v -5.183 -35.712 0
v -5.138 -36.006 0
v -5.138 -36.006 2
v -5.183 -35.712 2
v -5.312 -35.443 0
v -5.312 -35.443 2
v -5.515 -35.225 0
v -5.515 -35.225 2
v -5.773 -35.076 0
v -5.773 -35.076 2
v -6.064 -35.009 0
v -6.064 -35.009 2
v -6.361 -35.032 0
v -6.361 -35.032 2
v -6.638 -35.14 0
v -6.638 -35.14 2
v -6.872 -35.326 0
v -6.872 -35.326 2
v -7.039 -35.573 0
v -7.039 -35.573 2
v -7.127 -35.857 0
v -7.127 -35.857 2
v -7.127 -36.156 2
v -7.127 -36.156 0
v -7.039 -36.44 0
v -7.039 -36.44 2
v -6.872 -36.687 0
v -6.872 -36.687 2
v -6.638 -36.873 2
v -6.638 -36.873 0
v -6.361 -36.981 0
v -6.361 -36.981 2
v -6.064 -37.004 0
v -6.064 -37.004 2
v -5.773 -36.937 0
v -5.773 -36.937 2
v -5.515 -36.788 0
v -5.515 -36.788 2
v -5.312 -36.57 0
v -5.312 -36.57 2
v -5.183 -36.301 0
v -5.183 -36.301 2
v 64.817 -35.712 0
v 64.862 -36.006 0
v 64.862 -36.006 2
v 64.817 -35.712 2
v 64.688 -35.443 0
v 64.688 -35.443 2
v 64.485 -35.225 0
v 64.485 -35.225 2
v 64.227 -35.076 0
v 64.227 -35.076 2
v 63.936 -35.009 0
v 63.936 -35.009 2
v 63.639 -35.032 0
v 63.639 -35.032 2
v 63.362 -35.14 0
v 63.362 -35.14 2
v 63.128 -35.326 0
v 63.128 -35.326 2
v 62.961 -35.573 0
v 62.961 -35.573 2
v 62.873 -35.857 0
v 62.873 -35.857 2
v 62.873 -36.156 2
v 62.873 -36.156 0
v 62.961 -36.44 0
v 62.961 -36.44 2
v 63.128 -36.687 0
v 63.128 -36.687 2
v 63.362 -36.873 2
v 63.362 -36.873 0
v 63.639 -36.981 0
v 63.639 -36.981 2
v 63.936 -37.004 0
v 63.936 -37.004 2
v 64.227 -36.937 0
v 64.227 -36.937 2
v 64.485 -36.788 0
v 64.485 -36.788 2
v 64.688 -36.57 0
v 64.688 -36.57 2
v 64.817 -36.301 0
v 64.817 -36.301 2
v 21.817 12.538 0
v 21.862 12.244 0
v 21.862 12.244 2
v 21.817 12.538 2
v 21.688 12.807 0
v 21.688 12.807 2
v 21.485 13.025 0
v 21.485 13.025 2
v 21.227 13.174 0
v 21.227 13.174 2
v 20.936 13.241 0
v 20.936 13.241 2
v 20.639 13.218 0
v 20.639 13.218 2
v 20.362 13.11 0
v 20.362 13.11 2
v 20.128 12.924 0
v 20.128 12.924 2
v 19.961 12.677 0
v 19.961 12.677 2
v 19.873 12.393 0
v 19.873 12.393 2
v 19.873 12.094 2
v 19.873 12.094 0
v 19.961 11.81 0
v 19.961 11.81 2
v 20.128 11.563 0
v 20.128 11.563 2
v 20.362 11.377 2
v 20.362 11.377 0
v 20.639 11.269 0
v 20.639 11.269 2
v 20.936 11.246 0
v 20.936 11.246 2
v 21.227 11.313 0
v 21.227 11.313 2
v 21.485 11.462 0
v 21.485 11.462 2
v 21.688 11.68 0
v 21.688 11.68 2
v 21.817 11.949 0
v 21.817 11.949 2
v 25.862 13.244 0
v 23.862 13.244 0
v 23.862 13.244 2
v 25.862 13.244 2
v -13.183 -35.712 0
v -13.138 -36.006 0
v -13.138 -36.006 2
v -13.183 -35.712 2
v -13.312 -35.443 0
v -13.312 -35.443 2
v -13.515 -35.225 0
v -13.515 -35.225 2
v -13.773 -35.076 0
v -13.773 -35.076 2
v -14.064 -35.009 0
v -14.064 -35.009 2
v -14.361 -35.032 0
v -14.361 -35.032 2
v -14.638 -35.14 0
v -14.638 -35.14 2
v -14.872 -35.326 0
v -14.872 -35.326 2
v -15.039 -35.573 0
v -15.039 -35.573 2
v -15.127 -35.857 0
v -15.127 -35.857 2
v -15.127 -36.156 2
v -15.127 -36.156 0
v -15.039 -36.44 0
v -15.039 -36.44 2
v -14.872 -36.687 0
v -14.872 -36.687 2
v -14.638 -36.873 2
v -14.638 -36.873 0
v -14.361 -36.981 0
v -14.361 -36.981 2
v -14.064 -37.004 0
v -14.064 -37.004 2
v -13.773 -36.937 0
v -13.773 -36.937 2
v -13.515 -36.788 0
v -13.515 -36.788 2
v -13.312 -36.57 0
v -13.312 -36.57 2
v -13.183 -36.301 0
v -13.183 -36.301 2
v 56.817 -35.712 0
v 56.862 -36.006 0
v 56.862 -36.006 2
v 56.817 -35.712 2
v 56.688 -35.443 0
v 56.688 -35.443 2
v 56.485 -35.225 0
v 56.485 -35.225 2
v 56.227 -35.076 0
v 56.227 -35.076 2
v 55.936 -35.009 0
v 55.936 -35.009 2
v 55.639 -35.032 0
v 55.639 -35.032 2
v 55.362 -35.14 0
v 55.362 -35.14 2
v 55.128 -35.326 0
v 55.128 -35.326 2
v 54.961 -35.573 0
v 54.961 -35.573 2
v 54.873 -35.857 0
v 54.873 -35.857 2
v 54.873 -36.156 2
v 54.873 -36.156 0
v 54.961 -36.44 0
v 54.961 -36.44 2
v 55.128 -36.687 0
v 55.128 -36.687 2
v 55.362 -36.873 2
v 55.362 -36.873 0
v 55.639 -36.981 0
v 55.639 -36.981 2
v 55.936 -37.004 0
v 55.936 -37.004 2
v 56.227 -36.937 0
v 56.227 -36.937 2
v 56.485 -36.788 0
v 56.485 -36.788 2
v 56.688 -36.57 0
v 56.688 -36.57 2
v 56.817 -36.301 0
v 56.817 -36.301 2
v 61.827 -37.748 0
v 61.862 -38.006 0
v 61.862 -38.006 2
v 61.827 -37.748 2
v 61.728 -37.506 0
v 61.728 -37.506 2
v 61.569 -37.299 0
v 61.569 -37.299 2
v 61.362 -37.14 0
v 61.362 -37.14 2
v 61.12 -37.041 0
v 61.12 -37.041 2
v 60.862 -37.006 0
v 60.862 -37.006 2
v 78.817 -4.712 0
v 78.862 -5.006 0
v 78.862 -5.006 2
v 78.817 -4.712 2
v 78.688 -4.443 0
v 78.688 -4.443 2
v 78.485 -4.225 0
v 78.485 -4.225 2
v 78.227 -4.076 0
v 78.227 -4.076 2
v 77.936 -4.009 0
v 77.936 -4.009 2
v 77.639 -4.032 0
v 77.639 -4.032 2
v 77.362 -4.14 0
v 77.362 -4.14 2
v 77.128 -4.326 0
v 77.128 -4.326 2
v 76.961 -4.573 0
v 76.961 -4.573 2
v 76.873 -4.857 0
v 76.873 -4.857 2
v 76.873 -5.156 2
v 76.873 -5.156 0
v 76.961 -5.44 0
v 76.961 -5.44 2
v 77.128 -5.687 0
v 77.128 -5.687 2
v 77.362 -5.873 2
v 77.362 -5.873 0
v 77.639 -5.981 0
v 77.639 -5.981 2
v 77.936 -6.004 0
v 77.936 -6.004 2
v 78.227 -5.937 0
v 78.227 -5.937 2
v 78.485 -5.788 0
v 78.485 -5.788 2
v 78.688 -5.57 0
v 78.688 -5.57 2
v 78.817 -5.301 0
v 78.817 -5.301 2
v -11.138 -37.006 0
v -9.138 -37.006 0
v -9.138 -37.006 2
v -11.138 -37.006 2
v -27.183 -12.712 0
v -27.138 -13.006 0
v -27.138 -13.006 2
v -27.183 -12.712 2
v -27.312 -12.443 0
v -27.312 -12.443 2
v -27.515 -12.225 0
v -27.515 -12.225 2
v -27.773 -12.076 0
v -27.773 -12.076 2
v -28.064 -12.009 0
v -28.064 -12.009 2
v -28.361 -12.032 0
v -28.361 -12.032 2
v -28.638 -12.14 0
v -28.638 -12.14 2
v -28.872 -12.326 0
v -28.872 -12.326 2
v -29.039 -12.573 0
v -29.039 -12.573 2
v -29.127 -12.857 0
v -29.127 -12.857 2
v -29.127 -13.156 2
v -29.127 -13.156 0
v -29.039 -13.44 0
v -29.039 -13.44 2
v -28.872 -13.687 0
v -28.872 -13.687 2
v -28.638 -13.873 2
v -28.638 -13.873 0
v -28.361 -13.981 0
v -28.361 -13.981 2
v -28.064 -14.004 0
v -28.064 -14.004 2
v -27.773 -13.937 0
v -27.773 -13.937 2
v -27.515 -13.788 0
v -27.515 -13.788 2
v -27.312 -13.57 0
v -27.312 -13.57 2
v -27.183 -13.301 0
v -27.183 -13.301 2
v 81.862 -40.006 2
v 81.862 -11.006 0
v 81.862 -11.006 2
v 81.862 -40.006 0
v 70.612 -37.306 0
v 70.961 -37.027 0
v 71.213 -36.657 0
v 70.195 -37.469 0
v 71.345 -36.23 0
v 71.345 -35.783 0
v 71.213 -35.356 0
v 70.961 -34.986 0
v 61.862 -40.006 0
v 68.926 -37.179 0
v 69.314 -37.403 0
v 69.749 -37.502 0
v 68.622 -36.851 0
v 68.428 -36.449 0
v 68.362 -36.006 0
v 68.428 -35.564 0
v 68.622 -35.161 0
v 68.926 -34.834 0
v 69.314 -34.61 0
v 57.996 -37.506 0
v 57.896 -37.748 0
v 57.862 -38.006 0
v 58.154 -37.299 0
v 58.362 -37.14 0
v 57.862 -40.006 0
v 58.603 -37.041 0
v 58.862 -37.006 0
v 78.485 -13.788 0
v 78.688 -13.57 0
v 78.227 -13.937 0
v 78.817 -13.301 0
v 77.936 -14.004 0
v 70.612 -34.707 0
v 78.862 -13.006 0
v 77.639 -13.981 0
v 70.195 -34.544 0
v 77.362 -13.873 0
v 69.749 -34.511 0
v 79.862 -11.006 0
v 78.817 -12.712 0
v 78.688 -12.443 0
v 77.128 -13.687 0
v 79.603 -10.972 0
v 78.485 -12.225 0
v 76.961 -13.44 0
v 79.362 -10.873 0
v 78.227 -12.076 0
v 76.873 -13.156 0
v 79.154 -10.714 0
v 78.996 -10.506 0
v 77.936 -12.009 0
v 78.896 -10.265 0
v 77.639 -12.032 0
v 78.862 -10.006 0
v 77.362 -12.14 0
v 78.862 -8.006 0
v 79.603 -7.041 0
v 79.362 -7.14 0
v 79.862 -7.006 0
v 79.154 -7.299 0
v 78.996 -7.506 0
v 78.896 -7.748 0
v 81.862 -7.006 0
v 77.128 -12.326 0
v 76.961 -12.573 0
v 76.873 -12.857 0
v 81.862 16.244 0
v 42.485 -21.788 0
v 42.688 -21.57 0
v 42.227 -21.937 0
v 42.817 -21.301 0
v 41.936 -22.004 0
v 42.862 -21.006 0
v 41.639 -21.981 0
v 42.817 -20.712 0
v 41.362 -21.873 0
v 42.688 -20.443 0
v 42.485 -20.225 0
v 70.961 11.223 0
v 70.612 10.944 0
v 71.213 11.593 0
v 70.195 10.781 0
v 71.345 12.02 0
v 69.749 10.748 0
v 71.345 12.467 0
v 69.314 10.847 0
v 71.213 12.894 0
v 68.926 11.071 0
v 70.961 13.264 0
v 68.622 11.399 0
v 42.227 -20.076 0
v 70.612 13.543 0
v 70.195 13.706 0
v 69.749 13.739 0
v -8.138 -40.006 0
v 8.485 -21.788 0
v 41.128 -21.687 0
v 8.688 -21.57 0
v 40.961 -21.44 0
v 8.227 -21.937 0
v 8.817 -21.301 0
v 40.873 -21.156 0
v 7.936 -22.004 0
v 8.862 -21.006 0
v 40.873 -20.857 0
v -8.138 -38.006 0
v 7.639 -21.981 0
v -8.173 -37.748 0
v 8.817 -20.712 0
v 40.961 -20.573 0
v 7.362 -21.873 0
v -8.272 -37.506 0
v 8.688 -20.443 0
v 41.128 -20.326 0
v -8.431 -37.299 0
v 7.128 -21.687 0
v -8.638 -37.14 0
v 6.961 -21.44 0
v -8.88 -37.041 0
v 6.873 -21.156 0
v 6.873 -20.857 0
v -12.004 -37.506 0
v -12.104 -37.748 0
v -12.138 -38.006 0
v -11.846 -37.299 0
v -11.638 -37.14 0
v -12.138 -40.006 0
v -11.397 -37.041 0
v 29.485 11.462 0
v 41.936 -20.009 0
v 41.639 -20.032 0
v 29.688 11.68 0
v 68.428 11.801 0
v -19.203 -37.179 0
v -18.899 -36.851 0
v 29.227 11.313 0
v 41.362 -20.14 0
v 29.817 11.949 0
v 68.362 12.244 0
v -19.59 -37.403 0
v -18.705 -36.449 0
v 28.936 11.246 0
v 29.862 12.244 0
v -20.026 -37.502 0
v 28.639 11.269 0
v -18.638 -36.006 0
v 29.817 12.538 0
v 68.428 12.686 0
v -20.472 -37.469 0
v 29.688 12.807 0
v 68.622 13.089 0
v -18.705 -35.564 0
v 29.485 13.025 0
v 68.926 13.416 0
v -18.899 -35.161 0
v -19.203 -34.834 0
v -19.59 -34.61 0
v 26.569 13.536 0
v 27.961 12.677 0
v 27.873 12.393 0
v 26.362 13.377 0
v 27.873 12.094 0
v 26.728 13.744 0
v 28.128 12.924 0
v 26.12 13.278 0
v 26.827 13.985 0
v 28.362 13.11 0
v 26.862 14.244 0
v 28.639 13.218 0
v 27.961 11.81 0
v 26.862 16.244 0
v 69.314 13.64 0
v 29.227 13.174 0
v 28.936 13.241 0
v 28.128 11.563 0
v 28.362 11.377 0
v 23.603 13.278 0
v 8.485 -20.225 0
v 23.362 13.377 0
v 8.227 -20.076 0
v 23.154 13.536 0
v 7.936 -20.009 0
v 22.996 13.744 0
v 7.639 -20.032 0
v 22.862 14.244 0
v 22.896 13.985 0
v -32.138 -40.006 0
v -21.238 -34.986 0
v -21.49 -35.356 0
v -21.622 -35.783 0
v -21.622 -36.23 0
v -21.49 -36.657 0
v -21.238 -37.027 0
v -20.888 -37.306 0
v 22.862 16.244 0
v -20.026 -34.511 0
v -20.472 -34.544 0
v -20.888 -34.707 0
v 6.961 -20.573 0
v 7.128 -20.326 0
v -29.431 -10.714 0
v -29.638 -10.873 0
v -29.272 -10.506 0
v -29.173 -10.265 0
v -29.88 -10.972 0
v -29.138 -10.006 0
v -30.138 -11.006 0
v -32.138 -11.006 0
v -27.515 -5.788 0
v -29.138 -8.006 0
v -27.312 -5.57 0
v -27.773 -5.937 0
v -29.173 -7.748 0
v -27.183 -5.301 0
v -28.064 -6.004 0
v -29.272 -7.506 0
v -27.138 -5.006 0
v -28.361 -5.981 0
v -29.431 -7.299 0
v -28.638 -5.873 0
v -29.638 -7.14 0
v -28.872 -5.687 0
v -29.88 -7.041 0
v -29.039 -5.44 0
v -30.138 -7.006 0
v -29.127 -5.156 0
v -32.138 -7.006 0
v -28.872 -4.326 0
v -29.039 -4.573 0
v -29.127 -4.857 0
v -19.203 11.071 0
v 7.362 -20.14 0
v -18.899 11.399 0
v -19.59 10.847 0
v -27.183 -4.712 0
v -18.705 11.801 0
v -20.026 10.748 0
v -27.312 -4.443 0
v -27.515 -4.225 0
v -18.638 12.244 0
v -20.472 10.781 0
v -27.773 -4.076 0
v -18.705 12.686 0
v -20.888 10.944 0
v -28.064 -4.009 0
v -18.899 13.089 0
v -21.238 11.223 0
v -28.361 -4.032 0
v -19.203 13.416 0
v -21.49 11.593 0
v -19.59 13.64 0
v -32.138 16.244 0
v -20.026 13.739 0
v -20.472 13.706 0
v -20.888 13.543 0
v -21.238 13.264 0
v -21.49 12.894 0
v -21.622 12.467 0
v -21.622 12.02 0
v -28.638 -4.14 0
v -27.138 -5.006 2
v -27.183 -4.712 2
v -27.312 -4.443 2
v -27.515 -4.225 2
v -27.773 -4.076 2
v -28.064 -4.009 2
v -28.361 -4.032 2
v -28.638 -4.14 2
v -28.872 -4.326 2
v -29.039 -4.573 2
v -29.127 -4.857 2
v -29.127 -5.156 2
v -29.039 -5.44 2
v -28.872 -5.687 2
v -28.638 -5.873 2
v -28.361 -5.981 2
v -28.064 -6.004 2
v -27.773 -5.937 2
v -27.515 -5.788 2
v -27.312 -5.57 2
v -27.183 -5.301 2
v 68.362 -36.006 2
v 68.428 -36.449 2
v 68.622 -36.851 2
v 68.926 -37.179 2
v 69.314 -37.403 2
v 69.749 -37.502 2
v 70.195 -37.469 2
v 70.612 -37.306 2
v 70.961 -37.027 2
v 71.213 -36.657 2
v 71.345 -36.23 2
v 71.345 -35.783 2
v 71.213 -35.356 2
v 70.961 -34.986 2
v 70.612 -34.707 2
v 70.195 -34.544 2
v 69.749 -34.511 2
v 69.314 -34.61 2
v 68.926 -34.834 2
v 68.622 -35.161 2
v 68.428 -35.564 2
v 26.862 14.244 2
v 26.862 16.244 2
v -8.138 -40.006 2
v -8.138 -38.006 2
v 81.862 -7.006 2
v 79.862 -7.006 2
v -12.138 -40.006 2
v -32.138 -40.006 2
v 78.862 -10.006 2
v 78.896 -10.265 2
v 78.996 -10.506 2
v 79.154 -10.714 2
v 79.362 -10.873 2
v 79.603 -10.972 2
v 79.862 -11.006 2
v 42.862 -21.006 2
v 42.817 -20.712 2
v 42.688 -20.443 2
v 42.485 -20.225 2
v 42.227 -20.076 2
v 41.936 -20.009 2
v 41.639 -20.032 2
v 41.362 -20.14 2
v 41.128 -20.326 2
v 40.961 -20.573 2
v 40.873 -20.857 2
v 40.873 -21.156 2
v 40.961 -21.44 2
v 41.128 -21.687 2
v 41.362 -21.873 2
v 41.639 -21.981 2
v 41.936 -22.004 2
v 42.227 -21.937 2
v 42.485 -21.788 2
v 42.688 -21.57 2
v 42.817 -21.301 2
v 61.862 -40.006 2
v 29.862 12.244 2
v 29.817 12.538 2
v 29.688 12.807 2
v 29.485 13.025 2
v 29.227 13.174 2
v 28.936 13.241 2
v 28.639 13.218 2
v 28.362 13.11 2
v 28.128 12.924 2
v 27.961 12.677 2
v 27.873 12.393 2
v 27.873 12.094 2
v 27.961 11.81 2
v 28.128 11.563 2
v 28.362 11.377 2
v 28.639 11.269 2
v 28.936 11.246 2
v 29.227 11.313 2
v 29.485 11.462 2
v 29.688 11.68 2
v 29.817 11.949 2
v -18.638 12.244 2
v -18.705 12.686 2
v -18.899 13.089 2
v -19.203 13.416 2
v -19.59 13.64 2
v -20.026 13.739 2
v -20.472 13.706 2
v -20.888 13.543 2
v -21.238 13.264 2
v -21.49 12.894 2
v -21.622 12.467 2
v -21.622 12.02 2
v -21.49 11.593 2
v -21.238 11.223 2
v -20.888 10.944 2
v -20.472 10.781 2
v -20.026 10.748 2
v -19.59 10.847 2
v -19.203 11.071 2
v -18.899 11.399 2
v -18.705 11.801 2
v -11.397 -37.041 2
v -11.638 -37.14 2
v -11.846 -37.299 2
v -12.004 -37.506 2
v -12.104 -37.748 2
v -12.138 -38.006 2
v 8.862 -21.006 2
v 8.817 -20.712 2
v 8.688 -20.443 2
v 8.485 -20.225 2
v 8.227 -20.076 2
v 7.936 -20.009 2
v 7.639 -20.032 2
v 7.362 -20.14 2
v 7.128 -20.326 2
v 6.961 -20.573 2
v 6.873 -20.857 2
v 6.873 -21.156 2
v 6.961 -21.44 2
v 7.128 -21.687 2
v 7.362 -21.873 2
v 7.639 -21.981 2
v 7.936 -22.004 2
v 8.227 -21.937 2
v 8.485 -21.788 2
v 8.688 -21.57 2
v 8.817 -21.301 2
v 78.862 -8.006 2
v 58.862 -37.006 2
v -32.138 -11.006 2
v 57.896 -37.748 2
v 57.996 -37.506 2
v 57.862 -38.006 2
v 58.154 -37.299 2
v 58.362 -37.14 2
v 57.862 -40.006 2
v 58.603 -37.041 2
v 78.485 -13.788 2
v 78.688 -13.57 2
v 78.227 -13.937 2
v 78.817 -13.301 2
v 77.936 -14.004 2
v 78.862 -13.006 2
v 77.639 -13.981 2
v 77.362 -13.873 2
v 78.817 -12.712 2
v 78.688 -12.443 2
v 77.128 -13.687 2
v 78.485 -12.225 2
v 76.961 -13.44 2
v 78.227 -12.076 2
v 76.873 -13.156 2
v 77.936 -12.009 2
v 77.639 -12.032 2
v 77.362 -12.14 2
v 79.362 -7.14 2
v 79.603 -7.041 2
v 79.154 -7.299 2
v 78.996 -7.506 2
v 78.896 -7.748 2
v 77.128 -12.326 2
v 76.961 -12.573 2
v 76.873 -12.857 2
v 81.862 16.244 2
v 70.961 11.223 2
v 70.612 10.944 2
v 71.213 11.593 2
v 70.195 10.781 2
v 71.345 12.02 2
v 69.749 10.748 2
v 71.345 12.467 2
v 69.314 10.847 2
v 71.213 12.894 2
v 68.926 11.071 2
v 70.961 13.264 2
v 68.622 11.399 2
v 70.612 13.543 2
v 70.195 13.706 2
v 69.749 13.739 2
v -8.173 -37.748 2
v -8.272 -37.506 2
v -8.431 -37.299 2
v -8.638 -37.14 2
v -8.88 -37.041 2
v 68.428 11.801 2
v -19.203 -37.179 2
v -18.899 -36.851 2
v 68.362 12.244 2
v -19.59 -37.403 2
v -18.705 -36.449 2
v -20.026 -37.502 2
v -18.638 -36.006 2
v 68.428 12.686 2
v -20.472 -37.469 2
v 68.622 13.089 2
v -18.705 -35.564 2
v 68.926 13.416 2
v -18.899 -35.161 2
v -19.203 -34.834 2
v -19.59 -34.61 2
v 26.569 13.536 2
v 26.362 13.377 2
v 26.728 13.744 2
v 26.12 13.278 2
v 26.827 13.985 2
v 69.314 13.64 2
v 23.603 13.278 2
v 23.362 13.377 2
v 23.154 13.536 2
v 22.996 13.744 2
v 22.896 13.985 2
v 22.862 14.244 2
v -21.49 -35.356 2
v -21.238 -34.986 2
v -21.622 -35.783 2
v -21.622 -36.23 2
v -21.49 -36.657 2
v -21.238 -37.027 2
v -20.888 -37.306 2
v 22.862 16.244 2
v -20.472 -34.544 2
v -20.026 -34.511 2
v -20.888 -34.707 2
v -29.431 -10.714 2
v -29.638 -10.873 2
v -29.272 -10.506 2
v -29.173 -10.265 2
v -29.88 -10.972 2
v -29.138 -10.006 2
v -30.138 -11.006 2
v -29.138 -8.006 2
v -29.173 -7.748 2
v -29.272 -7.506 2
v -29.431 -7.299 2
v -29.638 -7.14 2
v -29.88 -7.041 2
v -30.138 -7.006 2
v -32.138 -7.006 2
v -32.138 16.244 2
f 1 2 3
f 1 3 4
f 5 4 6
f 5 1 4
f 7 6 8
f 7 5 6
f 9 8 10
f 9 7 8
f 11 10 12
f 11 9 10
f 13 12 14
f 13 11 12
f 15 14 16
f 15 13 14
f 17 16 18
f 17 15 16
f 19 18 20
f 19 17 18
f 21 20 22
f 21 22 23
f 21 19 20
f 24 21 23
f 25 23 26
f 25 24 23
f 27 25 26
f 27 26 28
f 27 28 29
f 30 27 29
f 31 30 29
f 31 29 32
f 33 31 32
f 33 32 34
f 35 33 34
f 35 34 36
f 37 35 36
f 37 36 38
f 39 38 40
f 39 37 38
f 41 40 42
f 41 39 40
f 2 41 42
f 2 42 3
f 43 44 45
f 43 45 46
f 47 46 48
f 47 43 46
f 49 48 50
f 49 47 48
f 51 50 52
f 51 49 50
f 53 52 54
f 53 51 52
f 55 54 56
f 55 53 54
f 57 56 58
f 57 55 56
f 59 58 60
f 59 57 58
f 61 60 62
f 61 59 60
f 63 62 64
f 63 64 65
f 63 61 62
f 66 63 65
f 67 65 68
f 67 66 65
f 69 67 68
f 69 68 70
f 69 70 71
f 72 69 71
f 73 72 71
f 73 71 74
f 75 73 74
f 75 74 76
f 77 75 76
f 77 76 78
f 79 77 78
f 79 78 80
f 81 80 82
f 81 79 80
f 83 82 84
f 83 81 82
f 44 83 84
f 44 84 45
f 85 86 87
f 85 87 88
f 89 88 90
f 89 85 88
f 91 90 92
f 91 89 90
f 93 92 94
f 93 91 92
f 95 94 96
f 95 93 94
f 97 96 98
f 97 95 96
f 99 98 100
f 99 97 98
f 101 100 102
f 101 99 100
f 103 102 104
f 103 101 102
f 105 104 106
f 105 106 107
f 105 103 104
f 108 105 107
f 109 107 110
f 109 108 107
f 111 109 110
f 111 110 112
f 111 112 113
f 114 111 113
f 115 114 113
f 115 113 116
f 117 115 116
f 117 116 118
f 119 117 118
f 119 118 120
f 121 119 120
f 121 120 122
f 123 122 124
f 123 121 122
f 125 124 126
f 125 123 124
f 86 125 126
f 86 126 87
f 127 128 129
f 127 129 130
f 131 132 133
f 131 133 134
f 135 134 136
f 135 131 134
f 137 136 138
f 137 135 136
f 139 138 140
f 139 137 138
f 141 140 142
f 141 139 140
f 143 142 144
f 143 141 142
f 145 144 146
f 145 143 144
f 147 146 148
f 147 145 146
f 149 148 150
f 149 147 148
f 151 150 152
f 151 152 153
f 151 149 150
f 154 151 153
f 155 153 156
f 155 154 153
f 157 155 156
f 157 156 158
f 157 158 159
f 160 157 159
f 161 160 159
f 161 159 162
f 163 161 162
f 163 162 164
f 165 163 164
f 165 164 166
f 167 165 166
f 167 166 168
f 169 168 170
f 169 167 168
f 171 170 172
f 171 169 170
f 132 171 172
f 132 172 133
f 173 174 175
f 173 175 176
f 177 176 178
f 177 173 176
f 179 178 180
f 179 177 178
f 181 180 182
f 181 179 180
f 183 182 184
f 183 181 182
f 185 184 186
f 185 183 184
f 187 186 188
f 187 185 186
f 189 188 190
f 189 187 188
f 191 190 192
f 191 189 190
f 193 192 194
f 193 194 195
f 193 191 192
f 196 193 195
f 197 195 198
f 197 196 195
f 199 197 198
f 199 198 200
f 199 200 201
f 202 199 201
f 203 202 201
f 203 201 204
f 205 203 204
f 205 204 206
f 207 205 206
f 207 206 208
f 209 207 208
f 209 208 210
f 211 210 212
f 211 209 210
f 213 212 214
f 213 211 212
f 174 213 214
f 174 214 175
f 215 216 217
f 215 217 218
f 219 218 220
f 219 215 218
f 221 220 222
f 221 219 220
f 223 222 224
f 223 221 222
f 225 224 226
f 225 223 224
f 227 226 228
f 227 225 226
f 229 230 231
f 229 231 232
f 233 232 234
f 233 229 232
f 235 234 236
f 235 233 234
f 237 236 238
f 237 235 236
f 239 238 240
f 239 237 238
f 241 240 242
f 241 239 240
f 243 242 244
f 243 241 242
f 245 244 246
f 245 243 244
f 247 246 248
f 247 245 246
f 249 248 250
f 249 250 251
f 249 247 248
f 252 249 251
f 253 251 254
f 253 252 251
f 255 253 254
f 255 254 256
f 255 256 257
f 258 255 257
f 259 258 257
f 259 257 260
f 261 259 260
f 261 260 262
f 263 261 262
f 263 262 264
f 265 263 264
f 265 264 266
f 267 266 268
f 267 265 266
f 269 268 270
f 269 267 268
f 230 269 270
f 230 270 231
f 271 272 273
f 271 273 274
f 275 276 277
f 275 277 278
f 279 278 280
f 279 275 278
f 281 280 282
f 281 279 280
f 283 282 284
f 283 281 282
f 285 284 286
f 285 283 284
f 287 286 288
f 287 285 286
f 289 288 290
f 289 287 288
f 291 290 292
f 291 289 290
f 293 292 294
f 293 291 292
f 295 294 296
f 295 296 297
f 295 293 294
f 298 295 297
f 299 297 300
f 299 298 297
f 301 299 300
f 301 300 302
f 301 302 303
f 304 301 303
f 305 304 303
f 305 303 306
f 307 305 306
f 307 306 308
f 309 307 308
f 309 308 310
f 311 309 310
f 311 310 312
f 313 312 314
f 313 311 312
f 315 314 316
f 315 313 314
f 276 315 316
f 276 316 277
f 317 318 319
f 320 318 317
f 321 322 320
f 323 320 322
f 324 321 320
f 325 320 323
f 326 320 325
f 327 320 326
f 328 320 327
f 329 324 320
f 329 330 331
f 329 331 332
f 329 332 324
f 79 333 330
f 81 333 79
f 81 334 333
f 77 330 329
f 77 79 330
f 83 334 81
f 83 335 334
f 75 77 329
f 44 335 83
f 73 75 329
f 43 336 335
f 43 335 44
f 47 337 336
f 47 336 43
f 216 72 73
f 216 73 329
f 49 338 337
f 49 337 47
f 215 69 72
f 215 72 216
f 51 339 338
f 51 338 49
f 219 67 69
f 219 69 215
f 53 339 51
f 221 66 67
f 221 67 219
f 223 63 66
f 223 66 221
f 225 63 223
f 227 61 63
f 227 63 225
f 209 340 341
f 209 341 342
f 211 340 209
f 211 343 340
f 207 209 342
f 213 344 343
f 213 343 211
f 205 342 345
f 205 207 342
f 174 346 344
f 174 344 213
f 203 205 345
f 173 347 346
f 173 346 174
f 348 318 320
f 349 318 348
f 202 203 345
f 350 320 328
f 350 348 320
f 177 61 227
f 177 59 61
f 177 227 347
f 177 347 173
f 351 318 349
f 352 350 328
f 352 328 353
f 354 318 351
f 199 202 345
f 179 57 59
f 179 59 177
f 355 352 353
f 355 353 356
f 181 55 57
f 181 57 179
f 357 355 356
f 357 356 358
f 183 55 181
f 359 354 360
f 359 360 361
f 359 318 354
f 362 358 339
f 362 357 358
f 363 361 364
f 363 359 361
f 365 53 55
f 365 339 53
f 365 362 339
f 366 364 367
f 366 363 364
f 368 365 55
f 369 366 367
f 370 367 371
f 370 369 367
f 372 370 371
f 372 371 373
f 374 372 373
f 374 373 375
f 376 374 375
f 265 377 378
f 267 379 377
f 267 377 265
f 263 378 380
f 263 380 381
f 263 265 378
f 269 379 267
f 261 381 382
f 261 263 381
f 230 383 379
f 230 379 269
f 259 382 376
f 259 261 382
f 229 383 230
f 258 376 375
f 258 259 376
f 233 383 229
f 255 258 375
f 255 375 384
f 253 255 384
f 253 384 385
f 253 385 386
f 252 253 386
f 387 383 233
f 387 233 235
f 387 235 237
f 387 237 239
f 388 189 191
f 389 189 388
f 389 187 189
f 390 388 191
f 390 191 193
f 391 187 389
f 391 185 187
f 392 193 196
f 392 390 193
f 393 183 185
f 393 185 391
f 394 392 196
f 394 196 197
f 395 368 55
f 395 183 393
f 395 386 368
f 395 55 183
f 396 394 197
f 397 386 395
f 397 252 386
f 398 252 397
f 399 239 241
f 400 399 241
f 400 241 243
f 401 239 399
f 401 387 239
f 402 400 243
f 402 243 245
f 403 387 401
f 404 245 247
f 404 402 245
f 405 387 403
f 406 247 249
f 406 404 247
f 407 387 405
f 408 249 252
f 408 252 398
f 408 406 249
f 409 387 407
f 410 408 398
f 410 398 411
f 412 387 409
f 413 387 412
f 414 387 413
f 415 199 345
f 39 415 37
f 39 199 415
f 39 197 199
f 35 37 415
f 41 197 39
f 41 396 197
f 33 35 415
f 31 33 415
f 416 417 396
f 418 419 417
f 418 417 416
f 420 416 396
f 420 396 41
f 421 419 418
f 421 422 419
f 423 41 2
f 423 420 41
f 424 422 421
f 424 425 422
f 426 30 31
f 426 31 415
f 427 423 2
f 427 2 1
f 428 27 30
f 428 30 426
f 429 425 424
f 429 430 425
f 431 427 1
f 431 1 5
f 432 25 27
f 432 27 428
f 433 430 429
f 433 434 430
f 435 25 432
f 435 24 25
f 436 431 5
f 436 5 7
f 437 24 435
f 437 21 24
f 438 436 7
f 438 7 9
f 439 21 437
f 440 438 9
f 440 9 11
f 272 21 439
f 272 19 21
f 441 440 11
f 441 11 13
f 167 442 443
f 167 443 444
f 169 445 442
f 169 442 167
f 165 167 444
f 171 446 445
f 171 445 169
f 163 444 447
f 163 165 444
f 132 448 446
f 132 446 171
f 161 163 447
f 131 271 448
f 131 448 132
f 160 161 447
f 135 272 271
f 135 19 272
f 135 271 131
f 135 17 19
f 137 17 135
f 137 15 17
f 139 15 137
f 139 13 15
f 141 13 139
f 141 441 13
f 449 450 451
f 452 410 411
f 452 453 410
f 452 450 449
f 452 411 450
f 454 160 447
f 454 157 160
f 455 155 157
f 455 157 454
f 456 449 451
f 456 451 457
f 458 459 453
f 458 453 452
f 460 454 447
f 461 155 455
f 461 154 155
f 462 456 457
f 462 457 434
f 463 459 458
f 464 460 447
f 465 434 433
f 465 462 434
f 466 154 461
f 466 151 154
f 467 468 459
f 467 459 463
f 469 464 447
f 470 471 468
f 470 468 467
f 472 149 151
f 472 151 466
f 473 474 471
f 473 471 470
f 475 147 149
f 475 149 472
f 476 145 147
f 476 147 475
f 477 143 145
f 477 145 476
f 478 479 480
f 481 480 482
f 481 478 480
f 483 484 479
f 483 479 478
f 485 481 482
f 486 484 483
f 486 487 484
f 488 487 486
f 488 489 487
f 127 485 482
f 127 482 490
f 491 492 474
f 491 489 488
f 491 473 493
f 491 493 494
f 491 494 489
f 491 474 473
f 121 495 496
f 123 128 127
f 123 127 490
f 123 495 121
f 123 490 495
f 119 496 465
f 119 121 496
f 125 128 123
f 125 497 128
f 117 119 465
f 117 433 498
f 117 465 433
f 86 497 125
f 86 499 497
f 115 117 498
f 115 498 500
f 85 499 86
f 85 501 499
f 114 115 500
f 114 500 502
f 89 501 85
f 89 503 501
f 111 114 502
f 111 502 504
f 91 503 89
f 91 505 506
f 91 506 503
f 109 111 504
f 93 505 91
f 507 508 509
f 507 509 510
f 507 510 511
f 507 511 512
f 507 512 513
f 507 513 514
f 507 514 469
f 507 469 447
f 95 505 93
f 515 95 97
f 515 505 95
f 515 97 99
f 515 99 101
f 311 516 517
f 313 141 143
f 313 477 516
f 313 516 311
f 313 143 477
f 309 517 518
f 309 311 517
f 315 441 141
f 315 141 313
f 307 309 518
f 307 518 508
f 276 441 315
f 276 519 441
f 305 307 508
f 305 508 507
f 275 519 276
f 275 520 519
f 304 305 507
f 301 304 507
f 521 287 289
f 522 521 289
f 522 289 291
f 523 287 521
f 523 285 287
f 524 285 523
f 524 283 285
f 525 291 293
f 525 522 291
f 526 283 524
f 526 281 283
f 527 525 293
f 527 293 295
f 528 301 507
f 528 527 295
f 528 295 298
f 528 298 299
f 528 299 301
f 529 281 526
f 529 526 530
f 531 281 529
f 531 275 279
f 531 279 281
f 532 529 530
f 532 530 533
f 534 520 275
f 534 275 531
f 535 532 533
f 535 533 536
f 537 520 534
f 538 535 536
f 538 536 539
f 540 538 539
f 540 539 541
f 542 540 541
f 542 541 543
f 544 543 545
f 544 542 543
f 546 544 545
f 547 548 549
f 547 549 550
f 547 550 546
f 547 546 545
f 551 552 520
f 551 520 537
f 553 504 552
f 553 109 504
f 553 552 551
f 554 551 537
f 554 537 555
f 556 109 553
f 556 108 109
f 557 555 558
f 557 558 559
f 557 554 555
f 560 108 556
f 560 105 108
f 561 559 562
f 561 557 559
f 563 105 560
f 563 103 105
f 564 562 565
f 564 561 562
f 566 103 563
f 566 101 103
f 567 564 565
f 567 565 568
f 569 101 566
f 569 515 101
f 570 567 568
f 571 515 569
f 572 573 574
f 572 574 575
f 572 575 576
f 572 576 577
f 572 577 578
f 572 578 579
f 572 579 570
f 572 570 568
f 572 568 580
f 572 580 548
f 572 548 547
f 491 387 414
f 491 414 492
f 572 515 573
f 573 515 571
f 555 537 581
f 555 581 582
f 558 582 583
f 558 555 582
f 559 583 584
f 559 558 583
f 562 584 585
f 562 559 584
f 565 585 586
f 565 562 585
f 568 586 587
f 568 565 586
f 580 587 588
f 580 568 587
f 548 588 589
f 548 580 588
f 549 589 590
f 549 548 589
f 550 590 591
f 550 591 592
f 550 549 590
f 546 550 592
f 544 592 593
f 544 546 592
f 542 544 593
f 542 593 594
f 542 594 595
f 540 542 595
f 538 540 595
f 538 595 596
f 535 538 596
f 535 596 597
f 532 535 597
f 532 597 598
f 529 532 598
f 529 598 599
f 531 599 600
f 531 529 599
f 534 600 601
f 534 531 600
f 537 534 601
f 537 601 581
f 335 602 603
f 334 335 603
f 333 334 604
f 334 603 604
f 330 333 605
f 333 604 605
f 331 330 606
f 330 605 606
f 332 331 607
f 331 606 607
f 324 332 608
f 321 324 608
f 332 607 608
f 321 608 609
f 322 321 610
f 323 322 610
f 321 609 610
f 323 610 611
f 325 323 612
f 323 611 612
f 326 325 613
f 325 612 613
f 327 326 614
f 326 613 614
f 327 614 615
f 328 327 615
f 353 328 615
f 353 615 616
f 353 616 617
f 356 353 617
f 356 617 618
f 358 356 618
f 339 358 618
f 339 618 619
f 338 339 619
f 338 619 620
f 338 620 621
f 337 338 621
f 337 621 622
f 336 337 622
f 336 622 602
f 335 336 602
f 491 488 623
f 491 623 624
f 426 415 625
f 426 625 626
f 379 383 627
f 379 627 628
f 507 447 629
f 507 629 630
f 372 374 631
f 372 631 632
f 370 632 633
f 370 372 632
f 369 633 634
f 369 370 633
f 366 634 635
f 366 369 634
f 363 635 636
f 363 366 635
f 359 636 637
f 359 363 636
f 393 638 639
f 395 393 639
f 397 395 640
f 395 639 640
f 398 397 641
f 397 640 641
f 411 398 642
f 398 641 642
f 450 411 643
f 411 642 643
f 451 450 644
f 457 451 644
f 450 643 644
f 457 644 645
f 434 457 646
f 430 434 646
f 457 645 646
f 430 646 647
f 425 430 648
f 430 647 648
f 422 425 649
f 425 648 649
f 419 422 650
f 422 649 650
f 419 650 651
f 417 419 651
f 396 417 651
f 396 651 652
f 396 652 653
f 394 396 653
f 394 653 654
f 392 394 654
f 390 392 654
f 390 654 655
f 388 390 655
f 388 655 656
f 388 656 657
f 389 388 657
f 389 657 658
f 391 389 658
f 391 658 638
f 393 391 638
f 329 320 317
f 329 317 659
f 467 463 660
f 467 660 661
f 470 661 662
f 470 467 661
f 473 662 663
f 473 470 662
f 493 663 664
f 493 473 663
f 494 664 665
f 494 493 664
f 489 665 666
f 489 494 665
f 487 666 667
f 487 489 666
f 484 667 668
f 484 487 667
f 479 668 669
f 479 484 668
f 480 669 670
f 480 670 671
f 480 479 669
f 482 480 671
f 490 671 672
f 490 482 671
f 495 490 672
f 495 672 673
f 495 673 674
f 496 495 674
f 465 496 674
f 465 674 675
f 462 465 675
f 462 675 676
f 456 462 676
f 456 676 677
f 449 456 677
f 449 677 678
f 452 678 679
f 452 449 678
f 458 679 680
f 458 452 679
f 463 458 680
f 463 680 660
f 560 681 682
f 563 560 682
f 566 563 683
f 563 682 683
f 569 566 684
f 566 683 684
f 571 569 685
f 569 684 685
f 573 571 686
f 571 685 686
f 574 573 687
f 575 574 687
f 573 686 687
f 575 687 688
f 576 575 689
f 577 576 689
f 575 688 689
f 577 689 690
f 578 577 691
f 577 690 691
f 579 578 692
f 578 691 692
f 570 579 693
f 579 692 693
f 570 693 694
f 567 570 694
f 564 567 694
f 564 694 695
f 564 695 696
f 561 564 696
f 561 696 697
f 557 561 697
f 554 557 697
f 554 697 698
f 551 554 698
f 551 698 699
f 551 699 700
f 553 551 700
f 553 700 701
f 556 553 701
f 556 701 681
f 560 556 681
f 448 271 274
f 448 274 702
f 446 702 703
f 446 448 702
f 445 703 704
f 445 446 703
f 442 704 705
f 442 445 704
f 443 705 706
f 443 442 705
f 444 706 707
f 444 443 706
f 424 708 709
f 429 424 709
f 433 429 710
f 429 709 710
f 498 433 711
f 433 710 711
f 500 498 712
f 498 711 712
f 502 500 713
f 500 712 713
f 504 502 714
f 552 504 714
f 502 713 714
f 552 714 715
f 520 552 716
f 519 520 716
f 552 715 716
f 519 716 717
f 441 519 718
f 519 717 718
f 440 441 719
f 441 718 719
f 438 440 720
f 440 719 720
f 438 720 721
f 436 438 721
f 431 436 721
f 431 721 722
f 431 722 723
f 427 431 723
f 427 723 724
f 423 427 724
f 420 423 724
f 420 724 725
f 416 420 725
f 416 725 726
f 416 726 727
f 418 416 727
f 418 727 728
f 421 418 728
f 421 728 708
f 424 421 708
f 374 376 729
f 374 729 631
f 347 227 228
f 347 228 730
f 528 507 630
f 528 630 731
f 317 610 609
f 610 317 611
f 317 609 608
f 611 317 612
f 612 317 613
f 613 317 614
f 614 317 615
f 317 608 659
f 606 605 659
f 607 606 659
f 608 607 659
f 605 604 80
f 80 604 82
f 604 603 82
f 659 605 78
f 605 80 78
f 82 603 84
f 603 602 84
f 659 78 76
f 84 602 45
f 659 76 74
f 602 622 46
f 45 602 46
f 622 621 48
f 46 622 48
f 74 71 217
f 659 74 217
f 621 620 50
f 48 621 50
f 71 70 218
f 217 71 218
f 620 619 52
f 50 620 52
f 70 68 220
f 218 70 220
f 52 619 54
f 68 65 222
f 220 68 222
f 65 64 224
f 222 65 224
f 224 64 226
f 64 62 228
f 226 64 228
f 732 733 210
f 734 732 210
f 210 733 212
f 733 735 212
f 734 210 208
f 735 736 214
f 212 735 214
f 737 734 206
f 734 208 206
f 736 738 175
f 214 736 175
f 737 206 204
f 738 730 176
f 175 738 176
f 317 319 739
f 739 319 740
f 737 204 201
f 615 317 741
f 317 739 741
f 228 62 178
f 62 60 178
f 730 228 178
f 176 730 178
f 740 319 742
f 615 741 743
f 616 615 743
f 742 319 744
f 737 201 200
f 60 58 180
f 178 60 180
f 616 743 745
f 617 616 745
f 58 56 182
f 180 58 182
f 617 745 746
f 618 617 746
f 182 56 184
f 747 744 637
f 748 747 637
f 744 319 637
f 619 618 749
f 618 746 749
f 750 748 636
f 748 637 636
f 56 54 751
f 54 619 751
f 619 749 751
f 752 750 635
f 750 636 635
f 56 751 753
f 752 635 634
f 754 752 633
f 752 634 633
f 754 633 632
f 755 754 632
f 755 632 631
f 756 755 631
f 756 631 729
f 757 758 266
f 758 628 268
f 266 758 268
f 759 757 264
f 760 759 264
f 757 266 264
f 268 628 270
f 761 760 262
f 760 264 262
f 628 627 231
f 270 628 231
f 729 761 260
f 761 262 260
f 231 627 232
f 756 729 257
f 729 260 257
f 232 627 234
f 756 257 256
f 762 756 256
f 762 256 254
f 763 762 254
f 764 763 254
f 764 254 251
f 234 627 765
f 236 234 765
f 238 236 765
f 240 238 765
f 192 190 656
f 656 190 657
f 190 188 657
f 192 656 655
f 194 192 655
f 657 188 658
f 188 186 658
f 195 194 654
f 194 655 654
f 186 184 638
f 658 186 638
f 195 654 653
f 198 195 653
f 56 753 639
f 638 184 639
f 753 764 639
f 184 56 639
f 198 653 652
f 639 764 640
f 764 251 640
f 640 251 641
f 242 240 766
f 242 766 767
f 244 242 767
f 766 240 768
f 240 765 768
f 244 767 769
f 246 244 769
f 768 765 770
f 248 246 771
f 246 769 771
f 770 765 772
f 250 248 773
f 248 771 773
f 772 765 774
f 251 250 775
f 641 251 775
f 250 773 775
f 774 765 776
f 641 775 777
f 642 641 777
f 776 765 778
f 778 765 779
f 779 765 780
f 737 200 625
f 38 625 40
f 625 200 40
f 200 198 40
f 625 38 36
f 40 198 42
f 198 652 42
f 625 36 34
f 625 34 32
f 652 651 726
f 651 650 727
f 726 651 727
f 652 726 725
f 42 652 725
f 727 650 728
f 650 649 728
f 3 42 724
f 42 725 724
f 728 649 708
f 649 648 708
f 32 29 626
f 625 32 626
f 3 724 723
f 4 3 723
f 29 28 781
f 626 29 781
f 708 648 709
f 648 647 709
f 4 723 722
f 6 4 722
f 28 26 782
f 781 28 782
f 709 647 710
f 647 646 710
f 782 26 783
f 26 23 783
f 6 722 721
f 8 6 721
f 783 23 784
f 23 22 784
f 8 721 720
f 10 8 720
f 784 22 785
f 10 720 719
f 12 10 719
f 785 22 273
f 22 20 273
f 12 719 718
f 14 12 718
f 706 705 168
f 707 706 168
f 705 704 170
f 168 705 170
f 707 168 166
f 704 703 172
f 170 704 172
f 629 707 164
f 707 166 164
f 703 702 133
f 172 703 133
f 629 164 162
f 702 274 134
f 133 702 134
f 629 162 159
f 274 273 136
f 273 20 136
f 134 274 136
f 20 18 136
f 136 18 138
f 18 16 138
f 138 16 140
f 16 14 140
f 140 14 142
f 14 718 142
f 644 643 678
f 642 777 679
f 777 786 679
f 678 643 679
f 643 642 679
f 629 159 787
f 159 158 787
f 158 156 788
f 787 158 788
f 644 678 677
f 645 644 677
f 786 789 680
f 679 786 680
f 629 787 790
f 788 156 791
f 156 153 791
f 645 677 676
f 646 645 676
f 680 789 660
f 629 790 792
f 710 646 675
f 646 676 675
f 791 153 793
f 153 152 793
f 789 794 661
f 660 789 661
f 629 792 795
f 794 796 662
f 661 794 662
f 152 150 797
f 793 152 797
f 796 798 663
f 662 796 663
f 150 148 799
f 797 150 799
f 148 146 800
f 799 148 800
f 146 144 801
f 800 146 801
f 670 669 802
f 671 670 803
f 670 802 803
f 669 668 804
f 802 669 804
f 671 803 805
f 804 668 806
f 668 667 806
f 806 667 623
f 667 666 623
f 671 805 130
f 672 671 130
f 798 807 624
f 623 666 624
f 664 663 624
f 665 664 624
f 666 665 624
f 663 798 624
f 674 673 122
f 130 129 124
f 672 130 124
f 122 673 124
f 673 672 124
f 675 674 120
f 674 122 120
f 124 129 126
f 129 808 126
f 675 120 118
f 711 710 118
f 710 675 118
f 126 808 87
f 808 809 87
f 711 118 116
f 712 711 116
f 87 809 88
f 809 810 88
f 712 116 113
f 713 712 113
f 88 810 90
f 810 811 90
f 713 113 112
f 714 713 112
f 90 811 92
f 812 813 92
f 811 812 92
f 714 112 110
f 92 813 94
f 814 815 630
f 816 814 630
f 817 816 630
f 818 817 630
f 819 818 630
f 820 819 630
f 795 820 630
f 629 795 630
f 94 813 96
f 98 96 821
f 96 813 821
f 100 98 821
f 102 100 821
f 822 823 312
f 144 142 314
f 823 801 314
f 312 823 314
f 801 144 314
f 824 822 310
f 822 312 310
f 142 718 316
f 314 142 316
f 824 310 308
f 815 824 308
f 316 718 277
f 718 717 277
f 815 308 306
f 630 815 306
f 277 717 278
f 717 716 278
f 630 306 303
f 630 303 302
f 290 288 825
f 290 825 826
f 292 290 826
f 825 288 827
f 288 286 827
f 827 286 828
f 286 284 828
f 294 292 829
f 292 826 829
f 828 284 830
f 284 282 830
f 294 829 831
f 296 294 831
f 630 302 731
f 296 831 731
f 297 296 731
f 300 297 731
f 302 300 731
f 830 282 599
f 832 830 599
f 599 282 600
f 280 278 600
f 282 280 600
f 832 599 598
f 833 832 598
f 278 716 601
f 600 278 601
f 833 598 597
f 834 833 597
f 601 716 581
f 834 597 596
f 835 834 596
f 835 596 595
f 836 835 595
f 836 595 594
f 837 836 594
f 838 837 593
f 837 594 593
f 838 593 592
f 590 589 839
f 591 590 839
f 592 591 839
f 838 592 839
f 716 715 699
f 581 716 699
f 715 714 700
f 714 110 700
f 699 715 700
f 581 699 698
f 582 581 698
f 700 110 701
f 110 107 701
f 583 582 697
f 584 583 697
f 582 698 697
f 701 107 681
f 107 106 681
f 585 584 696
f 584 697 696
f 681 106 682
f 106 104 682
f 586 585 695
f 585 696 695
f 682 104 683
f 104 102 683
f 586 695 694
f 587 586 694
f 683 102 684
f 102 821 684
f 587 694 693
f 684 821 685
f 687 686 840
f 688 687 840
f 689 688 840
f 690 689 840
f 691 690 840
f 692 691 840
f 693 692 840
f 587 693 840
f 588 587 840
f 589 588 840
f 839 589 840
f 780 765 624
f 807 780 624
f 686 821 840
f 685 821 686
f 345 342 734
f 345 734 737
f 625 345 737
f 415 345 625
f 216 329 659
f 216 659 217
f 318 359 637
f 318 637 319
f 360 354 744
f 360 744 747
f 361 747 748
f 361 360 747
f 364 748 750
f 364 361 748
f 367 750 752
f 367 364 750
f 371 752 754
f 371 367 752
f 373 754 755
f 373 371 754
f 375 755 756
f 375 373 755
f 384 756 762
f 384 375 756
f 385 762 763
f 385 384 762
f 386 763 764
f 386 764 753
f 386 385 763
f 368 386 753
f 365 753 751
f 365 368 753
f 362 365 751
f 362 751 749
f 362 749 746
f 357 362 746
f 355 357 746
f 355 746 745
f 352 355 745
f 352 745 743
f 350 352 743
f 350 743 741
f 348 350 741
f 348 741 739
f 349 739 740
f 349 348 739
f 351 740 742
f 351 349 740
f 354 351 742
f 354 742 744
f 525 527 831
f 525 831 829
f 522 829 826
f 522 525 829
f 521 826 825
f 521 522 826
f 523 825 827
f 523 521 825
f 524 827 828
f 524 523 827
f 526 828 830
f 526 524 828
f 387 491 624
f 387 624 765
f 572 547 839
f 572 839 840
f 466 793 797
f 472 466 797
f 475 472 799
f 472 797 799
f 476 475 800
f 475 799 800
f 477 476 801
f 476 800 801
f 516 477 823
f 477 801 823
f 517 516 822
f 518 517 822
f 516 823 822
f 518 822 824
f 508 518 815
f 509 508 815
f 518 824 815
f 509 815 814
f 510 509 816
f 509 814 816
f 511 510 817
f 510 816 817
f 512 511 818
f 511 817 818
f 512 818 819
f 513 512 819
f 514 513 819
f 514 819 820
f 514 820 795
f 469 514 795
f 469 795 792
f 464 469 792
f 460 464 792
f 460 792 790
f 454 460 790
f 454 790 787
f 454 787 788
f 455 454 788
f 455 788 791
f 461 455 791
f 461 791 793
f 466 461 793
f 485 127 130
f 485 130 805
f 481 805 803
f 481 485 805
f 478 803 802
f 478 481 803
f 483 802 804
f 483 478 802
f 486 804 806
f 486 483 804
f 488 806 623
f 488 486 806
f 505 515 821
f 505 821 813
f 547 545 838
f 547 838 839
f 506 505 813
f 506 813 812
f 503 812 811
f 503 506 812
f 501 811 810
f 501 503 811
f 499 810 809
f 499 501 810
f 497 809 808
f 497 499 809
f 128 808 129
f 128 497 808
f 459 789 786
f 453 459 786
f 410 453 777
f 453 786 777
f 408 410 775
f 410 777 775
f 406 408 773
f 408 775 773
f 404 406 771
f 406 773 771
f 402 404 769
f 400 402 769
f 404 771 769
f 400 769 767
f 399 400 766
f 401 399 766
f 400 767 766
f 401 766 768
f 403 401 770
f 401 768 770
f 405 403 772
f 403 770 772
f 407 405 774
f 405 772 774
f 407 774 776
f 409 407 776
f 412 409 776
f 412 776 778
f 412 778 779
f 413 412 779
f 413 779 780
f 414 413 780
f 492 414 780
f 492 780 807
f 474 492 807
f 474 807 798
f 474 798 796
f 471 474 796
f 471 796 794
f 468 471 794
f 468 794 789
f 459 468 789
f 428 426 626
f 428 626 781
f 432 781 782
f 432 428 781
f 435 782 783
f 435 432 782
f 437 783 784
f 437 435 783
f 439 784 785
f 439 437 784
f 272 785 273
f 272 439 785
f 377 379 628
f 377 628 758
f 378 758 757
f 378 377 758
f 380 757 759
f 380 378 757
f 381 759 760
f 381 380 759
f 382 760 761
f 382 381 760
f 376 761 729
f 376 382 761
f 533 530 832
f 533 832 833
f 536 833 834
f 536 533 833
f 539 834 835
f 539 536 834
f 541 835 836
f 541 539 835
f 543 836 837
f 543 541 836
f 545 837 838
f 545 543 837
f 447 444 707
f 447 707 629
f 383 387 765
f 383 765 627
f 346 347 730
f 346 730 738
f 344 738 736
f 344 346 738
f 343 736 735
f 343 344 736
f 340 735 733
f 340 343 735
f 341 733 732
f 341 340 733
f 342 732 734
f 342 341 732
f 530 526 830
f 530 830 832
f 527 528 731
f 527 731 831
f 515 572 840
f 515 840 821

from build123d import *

# Parameters (mm, degrees)
SKETCH_1_R          = 1
EXTRUDE_1_DEPTH     = 2
SKETCH_2_R          = 1
CUT_EXTRUDE_1_DEPTH = 10
SKETCH_3_R          = 1.5
CUT_EXTRUDE_2_DEPTH = 10


with BuildPart() as part:
    # 草圖1 → 填料-伸長1 (new body)
    with BuildSketch(Plane.XY):
        with BuildLine():
            Line((23.861531606, 13.243524775), (25.861531606, 13.243524775))
            ThreePointArc((25.861531606, 13.243524775), (26.568638387, 13.536417994), (26.861531606, 14.243524775))
            Line((26.861531606, 14.243524775), (26.861531606, 16.243524775))
            Line((26.861531606, 16.243524775), (80.861531606, 16.243524775))
            Line((80.861531606, 16.243524775), (81.861531606, 16.243524775))
            Line((81.861531606, 16.243524775), (81.861531606, 15.243524775))
            Line((81.861531606, 15.243524775), (81.861531606, -7.006475225))
            Line((81.861531606, -7.006475225), (79.861531606, -7.006475225))
            ThreePointArc((79.861531606, -7.006475225), (79.154424825, -7.299368444), (78.861531606, -8.006475225))
            Line((78.861531606, -8.006475225), (78.861531606, -10.006475225))
            ThreePointArc((78.861531606, -10.006475225), (79.154424825, -10.713582006), (79.861531606, -11.006475225))
            Line((79.861531606, -11.006475225), (81.861531606, -11.006475225))
            Line((81.861531606, -11.006475225), (81.861531606, -39.006475225))
            Line((81.861531606, -39.006475225), (81.861531606, -40.006475225))
            Line((81.861531606, -40.006475225), (80.861531606, -40.006475225))
            Line((80.861531606, -40.006475225), (61.861531606, -40.006475225))
            Line((61.861531606, -40.006475225), (61.861531606, -38.006475225))
            ThreePointArc((61.861531606, -38.006475225), (61.568638387, -37.299368444), (60.861531606, -37.006475225))
            Line((60.861531606, -37.006475225), (58.861531606, -37.006475225))
            ThreePointArc((58.861531606, -37.006475225), (58.154424825, -37.299368444), (57.861531606, -38.006475225))
            Line((57.861531606, -38.006475225), (57.861531606, -40.006475225))
            Line((57.861531606, -40.006475225), (-8.138468394, -40.006475225))
            Line((-8.138468394, -40.006475225), (-8.138468394, -38.006475225))
            ThreePointArc((-8.138468394, -38.006475225), (-8.431361613, -37.299368444), (-9.138468394, -37.006475225))
            Line((-9.138468394, -37.006475225), (-11.138468394, -37.006475225))
            ThreePointArc((-11.138468394, -37.006475225), (-11.845575175, -37.299368444), (-12.138468394, -38.006475225))
            Line((-12.138468394, -38.006475225), (-12.138468394, -40.006475225))
            Line((-12.138468394, -40.006475225), (-31.138468394, -40.006475225))
            Line((-31.138468394, -40.006475225), (-32.138468394, -40.006475225))
            Line((-32.138468394, -40.006475225), (-32.138468394, -39.006475225))
            Line((-32.138468394, -39.006475225), (-32.138468394, -11.006475225))
            Line((-32.138468394, -11.006475225), (-30.138468394, -11.006475225))
            ThreePointArc((-30.138468394, -11.006475225), (-29.431361613, -10.713582006), (-29.138468394, -10.006475225))
            Line((-29.138468394, -10.006475225), (-29.138468394, -8.006475225))
            ThreePointArc((-29.138468394, -8.006475225), (-29.431361613, -7.299368444), (-30.138468394, -7.006475225))
            Line((-30.138468394, -7.006475225), (-32.138468394, -7.006475225))
            Line((-32.138468394, -7.006475225), (-32.138468394, 15.243524775))
            Line((-32.138468394, 15.243524775), (-32.138468394, 16.243524775))
            Line((-32.138468394, 16.243524775), (-31.138468394, 16.243524775))
            Line((-31.138468394, 16.243524775), (22.861531606, 16.243524775))
            Line((22.861531606, 16.243524775), (22.861531606, 14.243524775))
            ThreePointArc((22.861531606, 14.243524775), (23.154424825, 13.536417994), (23.861531606, 13.243524775))
        make_face()
        with Locations((55.861531606, -36.006475225)):
            Circle(SKETCH_1_R, mode=Mode.SUBTRACT)
        with Locations((77.861531606, -5.006475225)):
            Circle(SKETCH_1_R, mode=Mode.SUBTRACT)
        with Locations((-6.138468394, -36.006475225)):
            Circle(SKETCH_1_R, mode=Mode.SUBTRACT)
        with Locations((28.861531606, 12.243524775)):
            Circle(SKETCH_1_R, mode=Mode.SUBTRACT)
        with Locations((20.861531606, 12.243524775)):
            Circle(SKETCH_1_R, mode=Mode.SUBTRACT)
        with Locations((-28.138468394, -5.006475225)):
            Circle(SKETCH_1_R, mode=Mode.SUBTRACT)
        with Locations((-28.138468394, -13.006475225)):
            Circle(SKETCH_1_R, mode=Mode.SUBTRACT)
        with Locations((77.861531606, -13.006475225)):
            Circle(SKETCH_1_R, mode=Mode.SUBTRACT)
        with Locations((-14.138468394, -36.006475225)):
            Circle(SKETCH_1_R, mode=Mode.SUBTRACT)
        with Locations((63.861531606, -36.006475225)):
            Circle(SKETCH_1_R, mode=Mode.SUBTRACT)
    extrude(amount=EXTRUDE_1_DEPTH)

    # 草圖2 → 除料-伸長1 (cut)
    with BuildSketch(Plane.XY.offset(2)):
        with Locations((7.861531606, -21.006475225)):
            Circle(SKETCH_2_R)
        with Locations((41.861531606, -21.006475225)):
            Circle(SKETCH_2_R)
    extrude(amount=-CUT_EXTRUDE_1_DEPTH, mode=Mode.SUBTRACT)

    # 草圖3 → 除料-伸長2 (cut)
    with BuildSketch(Plane.XY.offset(2)):
        with Locations((-20.138468394, -36.006475225)):
            Circle(SKETCH_3_R)
        with Locations((-20.138468394, 12.243524775)):
            Circle(SKETCH_3_R)
        with Locations(Location((69.861531606, 12.243524775, 0), (0, 0, 180))):
            Circle(SKETCH_3_R)
        with Locations(Location((69.861531606, -36.006475225, 0), (0, 0, 180))):
            Circle(SKETCH_3_R)
    extrude(amount=-CUT_EXTRUDE_2_DEPTH, mode=Mode.SUBTRACT)


solid = part.part
